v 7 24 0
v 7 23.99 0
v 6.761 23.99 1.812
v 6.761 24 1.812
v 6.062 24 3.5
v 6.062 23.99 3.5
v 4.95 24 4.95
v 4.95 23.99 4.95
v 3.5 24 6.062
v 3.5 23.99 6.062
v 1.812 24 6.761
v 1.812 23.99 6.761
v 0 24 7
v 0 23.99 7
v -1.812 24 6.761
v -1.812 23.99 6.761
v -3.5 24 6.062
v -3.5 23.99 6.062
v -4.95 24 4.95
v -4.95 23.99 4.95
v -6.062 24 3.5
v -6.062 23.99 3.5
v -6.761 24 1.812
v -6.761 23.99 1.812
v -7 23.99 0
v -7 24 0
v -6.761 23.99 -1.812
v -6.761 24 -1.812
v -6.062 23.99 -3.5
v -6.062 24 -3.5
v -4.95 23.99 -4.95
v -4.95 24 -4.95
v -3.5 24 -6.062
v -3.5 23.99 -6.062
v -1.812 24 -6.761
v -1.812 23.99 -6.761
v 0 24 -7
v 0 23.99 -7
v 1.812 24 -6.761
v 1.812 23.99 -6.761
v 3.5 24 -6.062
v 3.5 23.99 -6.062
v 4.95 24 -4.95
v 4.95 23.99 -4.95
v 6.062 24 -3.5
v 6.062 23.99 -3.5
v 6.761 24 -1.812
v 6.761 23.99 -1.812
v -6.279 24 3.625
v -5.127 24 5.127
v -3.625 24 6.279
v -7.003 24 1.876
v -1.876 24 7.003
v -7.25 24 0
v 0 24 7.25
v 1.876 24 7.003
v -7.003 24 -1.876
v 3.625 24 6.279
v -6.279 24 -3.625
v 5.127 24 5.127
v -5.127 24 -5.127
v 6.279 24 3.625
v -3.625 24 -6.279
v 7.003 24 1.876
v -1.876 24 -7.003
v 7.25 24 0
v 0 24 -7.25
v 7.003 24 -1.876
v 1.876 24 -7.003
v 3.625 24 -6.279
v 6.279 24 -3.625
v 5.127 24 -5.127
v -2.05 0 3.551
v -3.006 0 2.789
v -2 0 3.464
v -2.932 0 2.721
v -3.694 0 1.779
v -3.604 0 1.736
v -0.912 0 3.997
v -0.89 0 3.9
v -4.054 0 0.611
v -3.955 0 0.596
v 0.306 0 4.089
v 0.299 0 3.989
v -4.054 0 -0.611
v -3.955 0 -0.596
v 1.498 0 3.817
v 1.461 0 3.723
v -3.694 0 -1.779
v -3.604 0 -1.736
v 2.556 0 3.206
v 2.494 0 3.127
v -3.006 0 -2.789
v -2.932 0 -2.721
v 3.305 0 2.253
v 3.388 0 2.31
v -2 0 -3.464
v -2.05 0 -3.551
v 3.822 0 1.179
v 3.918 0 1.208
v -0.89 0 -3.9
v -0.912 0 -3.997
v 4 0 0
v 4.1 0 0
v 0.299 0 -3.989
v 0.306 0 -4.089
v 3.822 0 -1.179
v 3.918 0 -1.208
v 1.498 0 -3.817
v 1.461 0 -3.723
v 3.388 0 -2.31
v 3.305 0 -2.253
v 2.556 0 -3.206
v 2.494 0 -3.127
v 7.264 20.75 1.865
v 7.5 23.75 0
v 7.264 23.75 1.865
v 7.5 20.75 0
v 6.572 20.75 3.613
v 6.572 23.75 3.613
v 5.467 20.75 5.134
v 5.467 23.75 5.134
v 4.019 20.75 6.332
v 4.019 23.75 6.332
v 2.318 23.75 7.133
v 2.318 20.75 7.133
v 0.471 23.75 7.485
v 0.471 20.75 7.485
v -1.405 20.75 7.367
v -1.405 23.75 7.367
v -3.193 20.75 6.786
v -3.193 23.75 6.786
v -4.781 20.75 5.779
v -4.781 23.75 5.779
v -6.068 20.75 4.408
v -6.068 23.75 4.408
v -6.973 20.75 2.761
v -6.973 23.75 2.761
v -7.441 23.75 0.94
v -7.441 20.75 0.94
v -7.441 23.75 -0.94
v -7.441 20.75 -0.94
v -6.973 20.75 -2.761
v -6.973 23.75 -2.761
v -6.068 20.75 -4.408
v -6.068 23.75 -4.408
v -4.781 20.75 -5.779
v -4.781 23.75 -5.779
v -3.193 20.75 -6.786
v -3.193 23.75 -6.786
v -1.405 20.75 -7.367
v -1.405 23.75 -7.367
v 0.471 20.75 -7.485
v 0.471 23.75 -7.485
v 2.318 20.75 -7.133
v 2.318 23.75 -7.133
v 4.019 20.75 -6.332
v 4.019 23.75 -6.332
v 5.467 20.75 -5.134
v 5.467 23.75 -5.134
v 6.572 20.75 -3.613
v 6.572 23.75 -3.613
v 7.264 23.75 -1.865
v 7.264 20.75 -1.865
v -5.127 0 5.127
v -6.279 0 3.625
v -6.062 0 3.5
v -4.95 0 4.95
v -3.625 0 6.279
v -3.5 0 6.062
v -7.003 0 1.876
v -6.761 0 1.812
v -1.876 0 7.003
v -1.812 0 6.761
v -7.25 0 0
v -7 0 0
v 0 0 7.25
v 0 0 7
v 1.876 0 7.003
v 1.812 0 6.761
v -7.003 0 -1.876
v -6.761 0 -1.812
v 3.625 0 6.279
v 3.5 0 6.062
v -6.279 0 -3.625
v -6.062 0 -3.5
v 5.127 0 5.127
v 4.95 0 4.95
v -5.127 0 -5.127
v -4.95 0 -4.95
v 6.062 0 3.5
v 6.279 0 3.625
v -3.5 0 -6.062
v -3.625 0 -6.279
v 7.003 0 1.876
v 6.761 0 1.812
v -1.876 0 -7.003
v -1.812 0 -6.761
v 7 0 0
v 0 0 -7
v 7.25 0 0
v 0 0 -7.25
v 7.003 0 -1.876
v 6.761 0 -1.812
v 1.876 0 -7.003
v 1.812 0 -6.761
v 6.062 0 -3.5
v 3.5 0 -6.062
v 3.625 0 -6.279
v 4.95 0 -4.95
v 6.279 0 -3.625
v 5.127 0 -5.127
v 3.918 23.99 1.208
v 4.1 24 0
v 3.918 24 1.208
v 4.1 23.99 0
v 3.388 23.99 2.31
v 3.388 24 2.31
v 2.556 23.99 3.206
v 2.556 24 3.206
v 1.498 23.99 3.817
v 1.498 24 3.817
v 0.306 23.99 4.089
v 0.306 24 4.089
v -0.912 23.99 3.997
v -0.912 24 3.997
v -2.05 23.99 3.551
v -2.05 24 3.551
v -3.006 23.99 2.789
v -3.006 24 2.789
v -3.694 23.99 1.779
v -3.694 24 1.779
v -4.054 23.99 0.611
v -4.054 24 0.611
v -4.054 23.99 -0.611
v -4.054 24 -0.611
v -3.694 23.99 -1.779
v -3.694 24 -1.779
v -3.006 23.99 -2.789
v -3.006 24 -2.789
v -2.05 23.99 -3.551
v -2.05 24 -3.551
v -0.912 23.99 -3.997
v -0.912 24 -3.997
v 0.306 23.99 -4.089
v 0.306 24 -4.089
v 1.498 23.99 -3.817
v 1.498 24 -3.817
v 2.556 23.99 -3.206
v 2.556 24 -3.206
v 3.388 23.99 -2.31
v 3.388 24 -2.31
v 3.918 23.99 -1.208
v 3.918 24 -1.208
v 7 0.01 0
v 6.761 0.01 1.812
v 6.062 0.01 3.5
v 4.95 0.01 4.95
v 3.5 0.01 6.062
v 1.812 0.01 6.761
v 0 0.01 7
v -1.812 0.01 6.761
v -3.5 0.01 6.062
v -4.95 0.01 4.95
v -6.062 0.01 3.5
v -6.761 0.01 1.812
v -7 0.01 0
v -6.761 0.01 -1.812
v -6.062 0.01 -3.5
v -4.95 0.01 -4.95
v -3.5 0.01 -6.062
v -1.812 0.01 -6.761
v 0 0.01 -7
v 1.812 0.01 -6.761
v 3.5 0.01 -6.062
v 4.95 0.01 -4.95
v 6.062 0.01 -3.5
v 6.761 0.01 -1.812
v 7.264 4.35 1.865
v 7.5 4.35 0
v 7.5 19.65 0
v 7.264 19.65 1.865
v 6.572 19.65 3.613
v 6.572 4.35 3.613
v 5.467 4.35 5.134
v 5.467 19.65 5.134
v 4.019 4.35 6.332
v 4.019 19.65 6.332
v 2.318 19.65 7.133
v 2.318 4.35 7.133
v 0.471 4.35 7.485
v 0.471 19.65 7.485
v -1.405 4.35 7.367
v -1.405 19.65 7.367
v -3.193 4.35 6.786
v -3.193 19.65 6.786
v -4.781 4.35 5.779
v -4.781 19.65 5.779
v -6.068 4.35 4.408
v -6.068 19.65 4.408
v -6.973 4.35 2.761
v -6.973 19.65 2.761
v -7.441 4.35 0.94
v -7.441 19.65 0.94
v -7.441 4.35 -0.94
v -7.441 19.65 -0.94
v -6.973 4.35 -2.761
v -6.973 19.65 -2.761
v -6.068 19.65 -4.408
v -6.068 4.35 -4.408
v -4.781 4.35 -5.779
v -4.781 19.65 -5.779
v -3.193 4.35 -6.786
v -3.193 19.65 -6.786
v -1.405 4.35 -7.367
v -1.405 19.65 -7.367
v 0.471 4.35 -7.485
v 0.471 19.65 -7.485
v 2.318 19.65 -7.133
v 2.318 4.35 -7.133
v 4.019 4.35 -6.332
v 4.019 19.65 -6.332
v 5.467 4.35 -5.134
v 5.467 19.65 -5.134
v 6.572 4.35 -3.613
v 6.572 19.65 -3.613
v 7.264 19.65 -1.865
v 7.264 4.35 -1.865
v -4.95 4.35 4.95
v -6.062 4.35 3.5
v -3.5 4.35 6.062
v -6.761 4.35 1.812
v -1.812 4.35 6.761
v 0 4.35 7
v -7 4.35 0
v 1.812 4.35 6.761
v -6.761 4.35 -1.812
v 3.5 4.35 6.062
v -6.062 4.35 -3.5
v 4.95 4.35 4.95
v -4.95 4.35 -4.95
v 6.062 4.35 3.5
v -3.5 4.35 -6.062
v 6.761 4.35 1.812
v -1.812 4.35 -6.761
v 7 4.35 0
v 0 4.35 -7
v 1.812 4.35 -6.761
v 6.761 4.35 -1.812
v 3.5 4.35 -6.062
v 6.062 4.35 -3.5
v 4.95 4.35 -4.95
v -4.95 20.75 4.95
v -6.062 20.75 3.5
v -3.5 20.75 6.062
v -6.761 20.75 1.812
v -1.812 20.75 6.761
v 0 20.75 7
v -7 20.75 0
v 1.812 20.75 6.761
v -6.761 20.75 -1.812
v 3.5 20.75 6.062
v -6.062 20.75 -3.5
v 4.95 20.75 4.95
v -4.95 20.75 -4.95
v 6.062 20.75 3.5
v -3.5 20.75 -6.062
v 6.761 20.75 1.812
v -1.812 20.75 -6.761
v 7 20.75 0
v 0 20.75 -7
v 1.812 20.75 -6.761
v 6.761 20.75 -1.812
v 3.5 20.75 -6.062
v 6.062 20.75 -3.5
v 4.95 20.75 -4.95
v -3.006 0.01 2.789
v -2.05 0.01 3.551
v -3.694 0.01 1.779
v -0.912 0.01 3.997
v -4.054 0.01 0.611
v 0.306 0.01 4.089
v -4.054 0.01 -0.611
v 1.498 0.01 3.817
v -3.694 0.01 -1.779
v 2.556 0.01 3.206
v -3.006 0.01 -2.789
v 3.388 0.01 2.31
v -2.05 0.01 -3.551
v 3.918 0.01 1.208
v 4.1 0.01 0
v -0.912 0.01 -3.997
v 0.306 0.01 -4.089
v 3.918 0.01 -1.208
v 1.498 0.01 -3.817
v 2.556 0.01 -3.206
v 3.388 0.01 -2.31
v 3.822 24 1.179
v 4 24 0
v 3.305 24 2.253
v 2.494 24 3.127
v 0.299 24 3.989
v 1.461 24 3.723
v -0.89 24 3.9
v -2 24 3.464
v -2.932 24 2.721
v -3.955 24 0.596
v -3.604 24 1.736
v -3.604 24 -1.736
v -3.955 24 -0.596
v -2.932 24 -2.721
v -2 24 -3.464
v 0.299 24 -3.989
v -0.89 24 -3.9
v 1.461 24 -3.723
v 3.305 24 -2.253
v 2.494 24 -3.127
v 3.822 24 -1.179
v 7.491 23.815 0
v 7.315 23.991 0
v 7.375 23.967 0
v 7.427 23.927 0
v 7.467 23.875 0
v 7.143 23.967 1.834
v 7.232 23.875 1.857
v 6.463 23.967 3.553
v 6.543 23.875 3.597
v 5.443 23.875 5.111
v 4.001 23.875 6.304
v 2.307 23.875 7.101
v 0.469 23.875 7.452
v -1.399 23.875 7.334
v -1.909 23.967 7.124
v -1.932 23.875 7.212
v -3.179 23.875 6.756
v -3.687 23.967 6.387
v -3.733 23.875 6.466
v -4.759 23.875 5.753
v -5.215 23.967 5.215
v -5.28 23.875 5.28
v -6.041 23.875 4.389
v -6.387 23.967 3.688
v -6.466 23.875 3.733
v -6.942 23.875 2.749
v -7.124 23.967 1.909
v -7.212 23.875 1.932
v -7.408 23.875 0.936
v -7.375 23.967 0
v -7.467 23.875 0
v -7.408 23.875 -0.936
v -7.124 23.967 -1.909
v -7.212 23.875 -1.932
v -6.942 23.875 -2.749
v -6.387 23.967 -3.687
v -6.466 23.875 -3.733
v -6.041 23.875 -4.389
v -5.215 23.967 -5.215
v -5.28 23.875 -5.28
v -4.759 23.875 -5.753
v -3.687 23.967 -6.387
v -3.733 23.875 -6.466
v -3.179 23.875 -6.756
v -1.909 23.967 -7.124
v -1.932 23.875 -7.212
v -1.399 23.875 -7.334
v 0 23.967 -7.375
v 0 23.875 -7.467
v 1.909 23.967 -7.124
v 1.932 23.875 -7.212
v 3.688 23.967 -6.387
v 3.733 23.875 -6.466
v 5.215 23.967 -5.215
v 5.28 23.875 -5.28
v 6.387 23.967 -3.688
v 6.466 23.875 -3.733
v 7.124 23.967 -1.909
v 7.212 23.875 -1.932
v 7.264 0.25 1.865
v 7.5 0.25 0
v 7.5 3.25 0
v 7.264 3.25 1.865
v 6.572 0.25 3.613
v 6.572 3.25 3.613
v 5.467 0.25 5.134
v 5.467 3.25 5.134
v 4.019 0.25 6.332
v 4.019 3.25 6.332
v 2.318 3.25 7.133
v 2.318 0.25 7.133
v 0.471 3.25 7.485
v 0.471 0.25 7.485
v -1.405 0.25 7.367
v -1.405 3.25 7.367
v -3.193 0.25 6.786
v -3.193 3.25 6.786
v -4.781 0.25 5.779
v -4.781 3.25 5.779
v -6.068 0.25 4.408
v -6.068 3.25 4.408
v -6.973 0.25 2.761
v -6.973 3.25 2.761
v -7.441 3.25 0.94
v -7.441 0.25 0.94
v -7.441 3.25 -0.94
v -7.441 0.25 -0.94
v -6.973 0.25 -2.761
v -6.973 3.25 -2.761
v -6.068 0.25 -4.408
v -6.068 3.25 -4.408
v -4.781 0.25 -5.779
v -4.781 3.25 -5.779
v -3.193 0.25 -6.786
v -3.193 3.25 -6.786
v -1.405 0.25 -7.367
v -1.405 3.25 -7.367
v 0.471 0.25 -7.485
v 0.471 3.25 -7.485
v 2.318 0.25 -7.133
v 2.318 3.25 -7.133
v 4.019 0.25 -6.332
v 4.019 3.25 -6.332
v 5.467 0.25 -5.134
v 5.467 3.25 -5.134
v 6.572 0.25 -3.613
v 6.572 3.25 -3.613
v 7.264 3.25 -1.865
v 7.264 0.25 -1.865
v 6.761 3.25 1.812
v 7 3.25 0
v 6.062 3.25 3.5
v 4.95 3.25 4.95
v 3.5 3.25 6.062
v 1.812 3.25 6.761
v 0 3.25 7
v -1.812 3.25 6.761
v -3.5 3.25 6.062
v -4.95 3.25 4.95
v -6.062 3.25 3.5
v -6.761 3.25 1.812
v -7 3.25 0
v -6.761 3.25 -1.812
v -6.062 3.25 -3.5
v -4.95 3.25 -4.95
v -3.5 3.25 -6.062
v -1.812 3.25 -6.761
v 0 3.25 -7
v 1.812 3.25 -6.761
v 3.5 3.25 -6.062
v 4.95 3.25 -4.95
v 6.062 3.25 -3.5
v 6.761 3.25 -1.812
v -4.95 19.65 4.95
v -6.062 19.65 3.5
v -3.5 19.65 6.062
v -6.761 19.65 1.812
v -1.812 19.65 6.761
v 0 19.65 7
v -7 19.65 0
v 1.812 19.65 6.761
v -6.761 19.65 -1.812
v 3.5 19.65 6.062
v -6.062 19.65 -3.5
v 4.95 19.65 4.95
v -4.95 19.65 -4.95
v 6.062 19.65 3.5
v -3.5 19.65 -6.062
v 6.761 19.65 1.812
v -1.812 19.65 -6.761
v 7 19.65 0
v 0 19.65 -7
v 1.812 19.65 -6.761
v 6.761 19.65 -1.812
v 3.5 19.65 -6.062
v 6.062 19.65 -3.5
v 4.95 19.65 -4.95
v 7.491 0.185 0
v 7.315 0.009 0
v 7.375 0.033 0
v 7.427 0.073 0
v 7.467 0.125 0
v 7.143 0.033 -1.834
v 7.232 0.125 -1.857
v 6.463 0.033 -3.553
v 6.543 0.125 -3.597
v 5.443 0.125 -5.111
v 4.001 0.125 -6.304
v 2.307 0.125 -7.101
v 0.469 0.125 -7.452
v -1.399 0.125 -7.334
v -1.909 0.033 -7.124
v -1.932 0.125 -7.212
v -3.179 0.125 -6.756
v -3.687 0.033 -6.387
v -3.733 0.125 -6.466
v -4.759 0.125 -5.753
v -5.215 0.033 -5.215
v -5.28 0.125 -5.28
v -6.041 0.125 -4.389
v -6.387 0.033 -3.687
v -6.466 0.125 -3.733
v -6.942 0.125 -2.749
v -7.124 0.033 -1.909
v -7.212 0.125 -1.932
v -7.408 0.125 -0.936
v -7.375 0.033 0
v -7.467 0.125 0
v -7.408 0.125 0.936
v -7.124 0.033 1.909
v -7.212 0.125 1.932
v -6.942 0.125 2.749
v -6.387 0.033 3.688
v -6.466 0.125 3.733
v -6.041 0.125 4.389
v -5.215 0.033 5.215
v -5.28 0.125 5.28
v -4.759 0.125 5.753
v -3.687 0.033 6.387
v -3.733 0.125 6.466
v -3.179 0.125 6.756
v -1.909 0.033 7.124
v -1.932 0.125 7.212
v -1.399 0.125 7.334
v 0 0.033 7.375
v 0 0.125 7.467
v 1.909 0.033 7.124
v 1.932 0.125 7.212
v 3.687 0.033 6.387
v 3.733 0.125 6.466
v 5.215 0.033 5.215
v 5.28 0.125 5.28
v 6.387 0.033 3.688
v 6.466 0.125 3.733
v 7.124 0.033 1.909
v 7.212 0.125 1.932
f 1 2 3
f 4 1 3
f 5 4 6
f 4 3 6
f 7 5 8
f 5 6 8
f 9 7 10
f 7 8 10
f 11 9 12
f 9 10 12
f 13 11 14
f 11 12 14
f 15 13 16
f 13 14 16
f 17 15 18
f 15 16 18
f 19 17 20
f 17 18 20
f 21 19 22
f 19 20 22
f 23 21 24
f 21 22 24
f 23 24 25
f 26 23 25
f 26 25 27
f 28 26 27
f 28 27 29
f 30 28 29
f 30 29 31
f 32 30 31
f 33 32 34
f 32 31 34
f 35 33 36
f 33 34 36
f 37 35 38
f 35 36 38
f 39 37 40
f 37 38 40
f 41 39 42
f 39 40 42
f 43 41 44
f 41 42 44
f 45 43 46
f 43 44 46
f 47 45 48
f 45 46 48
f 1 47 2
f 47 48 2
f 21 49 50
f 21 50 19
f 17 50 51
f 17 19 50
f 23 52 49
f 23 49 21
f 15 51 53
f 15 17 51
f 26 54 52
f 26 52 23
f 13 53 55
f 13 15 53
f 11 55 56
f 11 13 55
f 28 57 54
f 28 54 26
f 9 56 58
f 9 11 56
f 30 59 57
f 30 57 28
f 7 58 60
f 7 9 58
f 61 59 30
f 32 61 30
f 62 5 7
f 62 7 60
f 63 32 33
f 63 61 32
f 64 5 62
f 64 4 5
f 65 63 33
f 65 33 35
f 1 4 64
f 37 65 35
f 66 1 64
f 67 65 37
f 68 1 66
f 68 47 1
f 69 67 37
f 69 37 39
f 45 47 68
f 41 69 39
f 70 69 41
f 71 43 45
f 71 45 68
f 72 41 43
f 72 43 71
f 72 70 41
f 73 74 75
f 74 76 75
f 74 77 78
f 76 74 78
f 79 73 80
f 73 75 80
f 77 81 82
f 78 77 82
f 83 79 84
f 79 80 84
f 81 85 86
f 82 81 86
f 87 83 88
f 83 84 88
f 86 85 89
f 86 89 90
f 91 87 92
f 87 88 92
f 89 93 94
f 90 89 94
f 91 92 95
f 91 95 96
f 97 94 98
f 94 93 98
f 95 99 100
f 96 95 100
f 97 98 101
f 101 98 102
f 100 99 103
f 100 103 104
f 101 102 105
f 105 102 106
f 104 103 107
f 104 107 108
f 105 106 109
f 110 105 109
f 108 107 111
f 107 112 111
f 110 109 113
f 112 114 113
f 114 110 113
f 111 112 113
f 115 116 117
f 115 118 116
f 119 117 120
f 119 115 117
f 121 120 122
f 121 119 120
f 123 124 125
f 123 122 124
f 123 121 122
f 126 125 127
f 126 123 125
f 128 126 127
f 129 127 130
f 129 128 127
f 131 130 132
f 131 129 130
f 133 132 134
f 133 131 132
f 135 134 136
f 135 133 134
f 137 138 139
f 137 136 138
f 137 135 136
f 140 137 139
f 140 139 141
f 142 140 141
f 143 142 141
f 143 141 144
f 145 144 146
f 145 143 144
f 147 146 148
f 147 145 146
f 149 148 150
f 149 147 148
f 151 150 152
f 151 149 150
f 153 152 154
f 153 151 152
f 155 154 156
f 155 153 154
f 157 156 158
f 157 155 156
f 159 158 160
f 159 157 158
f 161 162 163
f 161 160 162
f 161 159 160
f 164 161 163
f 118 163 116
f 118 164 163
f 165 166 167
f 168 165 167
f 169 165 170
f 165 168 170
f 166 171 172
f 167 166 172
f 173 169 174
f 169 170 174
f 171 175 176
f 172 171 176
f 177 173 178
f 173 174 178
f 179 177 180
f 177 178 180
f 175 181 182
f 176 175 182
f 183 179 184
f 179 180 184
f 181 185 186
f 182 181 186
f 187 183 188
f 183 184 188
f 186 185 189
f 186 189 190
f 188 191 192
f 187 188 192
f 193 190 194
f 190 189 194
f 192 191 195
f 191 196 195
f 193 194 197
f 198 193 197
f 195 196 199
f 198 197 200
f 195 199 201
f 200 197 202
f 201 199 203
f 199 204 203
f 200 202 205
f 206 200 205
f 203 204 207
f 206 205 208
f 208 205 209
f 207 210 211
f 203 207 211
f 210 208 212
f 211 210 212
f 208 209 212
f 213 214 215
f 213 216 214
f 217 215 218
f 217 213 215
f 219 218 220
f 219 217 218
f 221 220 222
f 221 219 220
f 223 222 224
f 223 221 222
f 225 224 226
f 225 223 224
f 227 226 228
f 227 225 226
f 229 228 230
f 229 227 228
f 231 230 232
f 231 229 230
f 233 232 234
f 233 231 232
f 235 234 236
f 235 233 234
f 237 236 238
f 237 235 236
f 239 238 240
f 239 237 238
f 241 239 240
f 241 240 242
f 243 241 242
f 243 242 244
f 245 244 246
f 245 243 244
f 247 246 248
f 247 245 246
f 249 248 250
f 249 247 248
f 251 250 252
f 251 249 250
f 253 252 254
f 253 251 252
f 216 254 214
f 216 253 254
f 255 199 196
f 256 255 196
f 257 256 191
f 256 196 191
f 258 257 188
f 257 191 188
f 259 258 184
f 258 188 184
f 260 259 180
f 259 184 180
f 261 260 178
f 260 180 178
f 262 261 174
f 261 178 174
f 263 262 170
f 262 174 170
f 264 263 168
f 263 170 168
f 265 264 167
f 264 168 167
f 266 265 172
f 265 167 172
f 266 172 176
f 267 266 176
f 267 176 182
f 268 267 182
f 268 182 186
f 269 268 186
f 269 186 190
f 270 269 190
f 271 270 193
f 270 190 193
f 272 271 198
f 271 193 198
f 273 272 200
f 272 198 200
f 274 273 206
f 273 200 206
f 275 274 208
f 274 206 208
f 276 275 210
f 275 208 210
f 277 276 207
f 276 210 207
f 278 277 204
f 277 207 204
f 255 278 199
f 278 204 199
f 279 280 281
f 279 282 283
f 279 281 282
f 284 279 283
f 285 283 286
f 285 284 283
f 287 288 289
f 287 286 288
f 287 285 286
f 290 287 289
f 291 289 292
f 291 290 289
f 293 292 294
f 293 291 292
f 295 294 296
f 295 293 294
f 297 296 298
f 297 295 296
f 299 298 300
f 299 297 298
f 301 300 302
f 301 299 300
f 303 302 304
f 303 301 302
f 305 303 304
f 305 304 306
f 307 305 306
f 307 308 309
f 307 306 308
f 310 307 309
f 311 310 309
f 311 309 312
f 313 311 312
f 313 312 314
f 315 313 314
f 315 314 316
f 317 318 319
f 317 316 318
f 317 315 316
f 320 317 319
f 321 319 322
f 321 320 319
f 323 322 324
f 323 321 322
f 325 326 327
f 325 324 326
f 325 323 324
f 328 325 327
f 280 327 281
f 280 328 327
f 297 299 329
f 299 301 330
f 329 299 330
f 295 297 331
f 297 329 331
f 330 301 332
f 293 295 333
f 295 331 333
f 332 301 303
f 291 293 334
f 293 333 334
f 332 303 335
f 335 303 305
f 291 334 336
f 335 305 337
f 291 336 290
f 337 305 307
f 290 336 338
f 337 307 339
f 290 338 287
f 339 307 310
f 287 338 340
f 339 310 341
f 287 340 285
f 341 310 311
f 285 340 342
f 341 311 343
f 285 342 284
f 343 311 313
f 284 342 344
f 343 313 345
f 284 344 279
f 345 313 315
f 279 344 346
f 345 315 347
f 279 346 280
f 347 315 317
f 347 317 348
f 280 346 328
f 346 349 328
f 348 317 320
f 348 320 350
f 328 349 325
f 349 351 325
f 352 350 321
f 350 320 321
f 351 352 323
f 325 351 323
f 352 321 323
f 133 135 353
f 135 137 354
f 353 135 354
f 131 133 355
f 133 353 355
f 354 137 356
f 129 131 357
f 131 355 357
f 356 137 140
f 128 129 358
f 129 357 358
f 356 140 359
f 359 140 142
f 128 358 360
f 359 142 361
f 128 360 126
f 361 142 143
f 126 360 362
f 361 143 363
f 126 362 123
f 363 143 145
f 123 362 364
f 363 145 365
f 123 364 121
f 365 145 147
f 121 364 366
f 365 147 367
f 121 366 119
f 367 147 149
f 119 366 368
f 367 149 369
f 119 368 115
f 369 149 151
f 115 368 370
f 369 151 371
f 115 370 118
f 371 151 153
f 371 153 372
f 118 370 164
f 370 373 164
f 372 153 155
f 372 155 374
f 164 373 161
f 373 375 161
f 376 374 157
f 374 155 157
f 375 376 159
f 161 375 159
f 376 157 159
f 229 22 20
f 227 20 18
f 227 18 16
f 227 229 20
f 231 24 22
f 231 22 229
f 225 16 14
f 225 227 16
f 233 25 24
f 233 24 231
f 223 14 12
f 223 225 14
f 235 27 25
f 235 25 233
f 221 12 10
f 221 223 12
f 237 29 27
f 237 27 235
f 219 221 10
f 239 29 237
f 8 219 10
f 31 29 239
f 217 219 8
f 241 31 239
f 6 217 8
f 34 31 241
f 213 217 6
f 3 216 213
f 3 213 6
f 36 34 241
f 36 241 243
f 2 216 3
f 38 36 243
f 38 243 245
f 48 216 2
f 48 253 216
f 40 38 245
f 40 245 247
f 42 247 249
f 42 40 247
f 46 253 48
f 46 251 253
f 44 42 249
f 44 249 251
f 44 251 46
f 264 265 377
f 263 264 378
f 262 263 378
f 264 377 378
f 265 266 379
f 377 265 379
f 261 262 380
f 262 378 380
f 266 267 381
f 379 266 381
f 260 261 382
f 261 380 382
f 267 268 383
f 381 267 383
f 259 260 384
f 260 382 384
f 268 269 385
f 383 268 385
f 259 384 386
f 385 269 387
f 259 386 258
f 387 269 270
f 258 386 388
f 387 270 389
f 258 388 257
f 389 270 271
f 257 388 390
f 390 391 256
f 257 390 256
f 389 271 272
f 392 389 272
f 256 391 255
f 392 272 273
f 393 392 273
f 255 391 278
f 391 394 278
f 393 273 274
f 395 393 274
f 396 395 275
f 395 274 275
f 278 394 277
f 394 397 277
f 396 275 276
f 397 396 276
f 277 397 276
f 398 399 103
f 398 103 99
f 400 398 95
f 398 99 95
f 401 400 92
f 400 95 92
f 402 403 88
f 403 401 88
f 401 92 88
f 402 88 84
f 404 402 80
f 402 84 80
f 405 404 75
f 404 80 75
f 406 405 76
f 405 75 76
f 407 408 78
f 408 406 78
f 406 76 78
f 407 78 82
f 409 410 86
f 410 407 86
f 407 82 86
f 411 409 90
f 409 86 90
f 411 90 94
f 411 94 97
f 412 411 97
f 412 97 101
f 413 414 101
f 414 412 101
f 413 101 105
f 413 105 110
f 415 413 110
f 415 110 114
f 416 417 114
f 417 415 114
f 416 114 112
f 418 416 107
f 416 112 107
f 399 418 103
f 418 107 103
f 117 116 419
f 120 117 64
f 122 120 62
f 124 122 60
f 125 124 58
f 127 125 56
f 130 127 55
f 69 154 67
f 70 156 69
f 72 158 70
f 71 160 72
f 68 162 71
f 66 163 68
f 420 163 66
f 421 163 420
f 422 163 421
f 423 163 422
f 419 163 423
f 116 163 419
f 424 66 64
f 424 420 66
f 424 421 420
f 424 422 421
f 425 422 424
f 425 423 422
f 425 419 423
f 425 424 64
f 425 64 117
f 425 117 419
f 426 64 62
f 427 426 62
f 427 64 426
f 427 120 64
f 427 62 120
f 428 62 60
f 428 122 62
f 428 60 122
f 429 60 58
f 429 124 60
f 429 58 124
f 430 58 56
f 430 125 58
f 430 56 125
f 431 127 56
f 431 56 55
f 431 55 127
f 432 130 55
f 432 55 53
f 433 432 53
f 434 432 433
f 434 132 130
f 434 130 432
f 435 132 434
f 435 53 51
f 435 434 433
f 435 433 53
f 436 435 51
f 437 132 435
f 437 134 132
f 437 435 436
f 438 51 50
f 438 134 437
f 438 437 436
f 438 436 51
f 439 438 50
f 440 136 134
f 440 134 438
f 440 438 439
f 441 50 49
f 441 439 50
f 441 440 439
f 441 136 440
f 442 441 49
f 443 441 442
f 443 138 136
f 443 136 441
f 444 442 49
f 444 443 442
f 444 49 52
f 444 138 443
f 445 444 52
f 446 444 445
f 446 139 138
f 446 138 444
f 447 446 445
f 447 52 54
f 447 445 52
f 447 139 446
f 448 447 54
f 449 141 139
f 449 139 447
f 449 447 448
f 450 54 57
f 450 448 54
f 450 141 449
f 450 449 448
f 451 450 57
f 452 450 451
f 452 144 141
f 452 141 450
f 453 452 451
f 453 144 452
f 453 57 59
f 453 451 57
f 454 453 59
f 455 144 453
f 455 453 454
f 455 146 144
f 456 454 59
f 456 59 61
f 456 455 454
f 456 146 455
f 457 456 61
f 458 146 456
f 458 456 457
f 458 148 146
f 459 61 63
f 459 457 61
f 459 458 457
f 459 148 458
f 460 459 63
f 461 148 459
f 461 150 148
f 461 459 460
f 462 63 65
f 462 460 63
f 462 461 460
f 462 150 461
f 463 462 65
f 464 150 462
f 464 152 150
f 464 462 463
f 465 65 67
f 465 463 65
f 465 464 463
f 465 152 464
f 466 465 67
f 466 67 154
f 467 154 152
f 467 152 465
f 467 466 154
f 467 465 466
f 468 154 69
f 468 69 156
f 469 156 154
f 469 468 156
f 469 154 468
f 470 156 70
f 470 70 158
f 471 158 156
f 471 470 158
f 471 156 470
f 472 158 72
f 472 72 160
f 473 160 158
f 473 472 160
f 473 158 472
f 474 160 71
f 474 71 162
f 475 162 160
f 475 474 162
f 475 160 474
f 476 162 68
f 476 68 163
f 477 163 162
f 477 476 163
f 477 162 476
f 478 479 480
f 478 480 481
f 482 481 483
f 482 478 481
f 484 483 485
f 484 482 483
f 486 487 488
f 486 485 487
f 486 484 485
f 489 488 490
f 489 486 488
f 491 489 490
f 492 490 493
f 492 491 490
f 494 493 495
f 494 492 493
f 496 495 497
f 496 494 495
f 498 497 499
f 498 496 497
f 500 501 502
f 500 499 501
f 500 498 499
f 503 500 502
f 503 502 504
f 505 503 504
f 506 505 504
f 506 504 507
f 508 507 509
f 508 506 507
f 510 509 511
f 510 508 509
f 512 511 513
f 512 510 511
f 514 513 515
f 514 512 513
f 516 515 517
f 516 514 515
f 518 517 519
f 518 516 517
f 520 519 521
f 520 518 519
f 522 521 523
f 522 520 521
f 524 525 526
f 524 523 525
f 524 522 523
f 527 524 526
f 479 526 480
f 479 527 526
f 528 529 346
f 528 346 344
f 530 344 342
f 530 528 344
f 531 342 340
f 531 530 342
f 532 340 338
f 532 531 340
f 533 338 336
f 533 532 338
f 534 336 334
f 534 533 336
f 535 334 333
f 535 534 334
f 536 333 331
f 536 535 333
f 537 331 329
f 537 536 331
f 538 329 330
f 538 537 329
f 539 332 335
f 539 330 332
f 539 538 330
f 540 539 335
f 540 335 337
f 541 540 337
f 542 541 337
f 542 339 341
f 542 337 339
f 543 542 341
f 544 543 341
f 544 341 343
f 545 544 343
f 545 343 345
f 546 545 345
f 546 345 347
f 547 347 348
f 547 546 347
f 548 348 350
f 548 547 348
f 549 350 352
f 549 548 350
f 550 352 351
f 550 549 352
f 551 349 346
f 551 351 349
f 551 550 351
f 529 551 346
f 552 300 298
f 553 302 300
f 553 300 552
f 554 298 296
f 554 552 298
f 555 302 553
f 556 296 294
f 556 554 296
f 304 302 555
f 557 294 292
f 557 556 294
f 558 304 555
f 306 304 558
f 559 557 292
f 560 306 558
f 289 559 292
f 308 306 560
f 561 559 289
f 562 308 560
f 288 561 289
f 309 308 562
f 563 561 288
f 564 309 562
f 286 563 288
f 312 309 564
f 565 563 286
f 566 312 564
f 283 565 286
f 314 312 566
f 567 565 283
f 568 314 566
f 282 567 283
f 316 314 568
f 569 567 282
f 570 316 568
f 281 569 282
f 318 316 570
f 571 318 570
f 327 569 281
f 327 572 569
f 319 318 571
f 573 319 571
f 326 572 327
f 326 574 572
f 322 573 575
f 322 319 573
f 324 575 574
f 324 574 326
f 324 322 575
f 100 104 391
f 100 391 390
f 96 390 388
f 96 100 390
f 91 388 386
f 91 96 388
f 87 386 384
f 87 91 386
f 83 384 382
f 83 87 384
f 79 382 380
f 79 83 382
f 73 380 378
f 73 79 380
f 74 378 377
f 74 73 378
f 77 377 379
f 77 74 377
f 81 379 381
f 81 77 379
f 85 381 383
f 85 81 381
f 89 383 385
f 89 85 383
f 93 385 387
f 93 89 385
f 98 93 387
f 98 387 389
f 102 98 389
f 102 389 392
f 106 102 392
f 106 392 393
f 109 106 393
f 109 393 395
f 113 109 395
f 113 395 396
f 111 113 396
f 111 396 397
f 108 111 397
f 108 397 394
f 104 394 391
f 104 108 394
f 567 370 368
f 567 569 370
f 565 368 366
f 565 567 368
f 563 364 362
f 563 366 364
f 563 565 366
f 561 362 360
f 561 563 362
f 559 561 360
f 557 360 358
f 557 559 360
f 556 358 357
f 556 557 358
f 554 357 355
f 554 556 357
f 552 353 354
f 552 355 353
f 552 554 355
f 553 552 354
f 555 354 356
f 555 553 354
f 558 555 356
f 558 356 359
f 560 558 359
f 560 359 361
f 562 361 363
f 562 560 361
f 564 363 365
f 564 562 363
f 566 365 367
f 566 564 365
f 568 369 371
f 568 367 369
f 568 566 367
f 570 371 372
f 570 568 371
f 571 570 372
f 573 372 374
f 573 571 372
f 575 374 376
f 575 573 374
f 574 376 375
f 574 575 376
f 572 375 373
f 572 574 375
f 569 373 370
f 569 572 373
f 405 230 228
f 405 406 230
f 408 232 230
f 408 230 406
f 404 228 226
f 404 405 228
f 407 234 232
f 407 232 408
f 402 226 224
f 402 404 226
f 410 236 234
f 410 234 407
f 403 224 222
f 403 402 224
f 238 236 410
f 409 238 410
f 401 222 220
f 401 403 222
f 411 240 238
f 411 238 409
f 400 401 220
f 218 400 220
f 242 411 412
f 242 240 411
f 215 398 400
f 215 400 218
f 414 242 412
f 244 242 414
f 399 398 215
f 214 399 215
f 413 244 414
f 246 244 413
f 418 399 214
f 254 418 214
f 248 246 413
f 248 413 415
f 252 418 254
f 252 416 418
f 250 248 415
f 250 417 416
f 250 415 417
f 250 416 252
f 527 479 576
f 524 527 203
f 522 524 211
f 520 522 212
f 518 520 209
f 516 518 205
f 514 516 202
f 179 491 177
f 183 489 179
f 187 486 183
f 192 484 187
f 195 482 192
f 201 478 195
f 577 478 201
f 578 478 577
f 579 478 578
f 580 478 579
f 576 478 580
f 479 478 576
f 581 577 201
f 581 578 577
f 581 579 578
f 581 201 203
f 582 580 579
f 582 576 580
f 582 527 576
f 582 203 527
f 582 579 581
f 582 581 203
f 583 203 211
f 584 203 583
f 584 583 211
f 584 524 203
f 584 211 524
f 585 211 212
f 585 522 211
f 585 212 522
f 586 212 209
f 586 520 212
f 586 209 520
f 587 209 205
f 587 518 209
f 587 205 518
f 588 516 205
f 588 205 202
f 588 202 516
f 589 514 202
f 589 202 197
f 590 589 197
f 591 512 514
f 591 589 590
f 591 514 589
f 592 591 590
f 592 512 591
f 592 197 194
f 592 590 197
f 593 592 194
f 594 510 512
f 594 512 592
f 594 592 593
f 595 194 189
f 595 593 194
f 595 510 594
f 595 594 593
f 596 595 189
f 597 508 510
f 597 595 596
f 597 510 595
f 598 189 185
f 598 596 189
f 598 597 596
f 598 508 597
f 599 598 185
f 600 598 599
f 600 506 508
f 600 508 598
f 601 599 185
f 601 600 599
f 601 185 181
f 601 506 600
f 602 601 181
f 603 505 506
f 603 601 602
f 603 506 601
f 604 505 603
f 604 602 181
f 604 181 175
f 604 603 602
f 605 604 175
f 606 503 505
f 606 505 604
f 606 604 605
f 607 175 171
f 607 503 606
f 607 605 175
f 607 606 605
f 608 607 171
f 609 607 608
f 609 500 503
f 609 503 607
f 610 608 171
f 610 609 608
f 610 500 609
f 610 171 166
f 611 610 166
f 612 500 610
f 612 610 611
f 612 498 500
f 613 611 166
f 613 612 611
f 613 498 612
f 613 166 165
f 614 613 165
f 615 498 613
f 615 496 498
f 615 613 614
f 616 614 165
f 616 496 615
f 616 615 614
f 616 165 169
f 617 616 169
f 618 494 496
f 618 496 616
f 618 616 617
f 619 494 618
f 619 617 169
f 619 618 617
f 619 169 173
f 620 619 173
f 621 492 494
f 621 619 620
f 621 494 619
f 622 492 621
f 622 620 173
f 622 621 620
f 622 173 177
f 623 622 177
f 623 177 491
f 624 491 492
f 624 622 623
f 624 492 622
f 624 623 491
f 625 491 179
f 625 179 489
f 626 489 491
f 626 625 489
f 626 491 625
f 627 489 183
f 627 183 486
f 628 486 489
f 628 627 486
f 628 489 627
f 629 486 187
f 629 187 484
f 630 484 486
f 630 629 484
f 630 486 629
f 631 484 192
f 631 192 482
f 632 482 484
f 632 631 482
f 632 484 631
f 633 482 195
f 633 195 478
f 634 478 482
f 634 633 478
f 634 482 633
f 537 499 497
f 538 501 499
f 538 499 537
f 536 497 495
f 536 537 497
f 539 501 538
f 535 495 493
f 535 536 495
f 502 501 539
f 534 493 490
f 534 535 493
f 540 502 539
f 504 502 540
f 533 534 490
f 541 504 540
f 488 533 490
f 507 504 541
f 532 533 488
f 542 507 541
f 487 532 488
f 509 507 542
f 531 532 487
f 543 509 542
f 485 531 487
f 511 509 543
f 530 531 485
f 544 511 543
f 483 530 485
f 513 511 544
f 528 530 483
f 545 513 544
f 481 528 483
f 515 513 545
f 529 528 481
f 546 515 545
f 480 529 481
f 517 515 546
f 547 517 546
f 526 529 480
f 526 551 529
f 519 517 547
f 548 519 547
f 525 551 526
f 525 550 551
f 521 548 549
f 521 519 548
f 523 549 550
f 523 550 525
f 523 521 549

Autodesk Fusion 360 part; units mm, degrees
sketch "front" plane through (0, 0, 0) normal (0, 1, 0) x (1, 0, 0) in component "LM8UU"
  circle A0 centre (0, 0) radius 4
  circle A1 centre (0, 0) radius 7
  circle A2 centre (0, 0) radius 7.5
  circle A3 centre (0, 0) radius 4.1
  dimension "d1" = 8
  dimension "d2" = 14
  dimension "d3" = 15
  dimension "d20" = 8.2
extrude "Extrude1" add sketch "front" along normal blind 3.25 contours A1 | A2 | A3 in component "LM8UU"
extrude "Extrude2" add sketch "front" along normal blind 1.1 from surface at 3.25 contours A1 | A3 in component "LM8UU"
extrude "Extrude3" add sketch "front" along normal blind 15.3 from surface at 4.35 contours A1 | A2 | A3 in component "LM8UU"
extrude "Extrude4" add sketch "front" along normal blind 1.1 from surface at 19.65 contours A1 | A3 in component "LM8UU"
extrude "Extrude5" add sketch "front" along normal blind 3.25 from surface at 20.75 contours A1 | A2 | A3 in component "LM8UU"
fillet "Fillet1" radius 0.25 2 edges at (-6.9925, 0, 2.7121) (-6.9925, 24, 2.7121) in component "LM8UU"
extrude "Extrude6" cut sketch "front" along normal blind 0.01 contours A1 in component "LM8UU"
extrude "Extrude7" cut sketch "front" along normal blind 0.01 from surface at 23.99 contours A1 in component "LM8UU"
component "LM8UU" placed x (1, 0, 0) y (0, 1, 0) z (0, 0, 1) at (0, 0, 0)
equation "d9 = 3.25 mm + 1.1 mm"
equation "d10 = 17.5 mm - 2.2 mm"
equation "d12 = 3.25 mm + 17.5 mm - 1.1 mm"
equation "d15 = 3.25 mm + 17.5 mm"
equation "d23 = 24 mm - 0.01 mm"
